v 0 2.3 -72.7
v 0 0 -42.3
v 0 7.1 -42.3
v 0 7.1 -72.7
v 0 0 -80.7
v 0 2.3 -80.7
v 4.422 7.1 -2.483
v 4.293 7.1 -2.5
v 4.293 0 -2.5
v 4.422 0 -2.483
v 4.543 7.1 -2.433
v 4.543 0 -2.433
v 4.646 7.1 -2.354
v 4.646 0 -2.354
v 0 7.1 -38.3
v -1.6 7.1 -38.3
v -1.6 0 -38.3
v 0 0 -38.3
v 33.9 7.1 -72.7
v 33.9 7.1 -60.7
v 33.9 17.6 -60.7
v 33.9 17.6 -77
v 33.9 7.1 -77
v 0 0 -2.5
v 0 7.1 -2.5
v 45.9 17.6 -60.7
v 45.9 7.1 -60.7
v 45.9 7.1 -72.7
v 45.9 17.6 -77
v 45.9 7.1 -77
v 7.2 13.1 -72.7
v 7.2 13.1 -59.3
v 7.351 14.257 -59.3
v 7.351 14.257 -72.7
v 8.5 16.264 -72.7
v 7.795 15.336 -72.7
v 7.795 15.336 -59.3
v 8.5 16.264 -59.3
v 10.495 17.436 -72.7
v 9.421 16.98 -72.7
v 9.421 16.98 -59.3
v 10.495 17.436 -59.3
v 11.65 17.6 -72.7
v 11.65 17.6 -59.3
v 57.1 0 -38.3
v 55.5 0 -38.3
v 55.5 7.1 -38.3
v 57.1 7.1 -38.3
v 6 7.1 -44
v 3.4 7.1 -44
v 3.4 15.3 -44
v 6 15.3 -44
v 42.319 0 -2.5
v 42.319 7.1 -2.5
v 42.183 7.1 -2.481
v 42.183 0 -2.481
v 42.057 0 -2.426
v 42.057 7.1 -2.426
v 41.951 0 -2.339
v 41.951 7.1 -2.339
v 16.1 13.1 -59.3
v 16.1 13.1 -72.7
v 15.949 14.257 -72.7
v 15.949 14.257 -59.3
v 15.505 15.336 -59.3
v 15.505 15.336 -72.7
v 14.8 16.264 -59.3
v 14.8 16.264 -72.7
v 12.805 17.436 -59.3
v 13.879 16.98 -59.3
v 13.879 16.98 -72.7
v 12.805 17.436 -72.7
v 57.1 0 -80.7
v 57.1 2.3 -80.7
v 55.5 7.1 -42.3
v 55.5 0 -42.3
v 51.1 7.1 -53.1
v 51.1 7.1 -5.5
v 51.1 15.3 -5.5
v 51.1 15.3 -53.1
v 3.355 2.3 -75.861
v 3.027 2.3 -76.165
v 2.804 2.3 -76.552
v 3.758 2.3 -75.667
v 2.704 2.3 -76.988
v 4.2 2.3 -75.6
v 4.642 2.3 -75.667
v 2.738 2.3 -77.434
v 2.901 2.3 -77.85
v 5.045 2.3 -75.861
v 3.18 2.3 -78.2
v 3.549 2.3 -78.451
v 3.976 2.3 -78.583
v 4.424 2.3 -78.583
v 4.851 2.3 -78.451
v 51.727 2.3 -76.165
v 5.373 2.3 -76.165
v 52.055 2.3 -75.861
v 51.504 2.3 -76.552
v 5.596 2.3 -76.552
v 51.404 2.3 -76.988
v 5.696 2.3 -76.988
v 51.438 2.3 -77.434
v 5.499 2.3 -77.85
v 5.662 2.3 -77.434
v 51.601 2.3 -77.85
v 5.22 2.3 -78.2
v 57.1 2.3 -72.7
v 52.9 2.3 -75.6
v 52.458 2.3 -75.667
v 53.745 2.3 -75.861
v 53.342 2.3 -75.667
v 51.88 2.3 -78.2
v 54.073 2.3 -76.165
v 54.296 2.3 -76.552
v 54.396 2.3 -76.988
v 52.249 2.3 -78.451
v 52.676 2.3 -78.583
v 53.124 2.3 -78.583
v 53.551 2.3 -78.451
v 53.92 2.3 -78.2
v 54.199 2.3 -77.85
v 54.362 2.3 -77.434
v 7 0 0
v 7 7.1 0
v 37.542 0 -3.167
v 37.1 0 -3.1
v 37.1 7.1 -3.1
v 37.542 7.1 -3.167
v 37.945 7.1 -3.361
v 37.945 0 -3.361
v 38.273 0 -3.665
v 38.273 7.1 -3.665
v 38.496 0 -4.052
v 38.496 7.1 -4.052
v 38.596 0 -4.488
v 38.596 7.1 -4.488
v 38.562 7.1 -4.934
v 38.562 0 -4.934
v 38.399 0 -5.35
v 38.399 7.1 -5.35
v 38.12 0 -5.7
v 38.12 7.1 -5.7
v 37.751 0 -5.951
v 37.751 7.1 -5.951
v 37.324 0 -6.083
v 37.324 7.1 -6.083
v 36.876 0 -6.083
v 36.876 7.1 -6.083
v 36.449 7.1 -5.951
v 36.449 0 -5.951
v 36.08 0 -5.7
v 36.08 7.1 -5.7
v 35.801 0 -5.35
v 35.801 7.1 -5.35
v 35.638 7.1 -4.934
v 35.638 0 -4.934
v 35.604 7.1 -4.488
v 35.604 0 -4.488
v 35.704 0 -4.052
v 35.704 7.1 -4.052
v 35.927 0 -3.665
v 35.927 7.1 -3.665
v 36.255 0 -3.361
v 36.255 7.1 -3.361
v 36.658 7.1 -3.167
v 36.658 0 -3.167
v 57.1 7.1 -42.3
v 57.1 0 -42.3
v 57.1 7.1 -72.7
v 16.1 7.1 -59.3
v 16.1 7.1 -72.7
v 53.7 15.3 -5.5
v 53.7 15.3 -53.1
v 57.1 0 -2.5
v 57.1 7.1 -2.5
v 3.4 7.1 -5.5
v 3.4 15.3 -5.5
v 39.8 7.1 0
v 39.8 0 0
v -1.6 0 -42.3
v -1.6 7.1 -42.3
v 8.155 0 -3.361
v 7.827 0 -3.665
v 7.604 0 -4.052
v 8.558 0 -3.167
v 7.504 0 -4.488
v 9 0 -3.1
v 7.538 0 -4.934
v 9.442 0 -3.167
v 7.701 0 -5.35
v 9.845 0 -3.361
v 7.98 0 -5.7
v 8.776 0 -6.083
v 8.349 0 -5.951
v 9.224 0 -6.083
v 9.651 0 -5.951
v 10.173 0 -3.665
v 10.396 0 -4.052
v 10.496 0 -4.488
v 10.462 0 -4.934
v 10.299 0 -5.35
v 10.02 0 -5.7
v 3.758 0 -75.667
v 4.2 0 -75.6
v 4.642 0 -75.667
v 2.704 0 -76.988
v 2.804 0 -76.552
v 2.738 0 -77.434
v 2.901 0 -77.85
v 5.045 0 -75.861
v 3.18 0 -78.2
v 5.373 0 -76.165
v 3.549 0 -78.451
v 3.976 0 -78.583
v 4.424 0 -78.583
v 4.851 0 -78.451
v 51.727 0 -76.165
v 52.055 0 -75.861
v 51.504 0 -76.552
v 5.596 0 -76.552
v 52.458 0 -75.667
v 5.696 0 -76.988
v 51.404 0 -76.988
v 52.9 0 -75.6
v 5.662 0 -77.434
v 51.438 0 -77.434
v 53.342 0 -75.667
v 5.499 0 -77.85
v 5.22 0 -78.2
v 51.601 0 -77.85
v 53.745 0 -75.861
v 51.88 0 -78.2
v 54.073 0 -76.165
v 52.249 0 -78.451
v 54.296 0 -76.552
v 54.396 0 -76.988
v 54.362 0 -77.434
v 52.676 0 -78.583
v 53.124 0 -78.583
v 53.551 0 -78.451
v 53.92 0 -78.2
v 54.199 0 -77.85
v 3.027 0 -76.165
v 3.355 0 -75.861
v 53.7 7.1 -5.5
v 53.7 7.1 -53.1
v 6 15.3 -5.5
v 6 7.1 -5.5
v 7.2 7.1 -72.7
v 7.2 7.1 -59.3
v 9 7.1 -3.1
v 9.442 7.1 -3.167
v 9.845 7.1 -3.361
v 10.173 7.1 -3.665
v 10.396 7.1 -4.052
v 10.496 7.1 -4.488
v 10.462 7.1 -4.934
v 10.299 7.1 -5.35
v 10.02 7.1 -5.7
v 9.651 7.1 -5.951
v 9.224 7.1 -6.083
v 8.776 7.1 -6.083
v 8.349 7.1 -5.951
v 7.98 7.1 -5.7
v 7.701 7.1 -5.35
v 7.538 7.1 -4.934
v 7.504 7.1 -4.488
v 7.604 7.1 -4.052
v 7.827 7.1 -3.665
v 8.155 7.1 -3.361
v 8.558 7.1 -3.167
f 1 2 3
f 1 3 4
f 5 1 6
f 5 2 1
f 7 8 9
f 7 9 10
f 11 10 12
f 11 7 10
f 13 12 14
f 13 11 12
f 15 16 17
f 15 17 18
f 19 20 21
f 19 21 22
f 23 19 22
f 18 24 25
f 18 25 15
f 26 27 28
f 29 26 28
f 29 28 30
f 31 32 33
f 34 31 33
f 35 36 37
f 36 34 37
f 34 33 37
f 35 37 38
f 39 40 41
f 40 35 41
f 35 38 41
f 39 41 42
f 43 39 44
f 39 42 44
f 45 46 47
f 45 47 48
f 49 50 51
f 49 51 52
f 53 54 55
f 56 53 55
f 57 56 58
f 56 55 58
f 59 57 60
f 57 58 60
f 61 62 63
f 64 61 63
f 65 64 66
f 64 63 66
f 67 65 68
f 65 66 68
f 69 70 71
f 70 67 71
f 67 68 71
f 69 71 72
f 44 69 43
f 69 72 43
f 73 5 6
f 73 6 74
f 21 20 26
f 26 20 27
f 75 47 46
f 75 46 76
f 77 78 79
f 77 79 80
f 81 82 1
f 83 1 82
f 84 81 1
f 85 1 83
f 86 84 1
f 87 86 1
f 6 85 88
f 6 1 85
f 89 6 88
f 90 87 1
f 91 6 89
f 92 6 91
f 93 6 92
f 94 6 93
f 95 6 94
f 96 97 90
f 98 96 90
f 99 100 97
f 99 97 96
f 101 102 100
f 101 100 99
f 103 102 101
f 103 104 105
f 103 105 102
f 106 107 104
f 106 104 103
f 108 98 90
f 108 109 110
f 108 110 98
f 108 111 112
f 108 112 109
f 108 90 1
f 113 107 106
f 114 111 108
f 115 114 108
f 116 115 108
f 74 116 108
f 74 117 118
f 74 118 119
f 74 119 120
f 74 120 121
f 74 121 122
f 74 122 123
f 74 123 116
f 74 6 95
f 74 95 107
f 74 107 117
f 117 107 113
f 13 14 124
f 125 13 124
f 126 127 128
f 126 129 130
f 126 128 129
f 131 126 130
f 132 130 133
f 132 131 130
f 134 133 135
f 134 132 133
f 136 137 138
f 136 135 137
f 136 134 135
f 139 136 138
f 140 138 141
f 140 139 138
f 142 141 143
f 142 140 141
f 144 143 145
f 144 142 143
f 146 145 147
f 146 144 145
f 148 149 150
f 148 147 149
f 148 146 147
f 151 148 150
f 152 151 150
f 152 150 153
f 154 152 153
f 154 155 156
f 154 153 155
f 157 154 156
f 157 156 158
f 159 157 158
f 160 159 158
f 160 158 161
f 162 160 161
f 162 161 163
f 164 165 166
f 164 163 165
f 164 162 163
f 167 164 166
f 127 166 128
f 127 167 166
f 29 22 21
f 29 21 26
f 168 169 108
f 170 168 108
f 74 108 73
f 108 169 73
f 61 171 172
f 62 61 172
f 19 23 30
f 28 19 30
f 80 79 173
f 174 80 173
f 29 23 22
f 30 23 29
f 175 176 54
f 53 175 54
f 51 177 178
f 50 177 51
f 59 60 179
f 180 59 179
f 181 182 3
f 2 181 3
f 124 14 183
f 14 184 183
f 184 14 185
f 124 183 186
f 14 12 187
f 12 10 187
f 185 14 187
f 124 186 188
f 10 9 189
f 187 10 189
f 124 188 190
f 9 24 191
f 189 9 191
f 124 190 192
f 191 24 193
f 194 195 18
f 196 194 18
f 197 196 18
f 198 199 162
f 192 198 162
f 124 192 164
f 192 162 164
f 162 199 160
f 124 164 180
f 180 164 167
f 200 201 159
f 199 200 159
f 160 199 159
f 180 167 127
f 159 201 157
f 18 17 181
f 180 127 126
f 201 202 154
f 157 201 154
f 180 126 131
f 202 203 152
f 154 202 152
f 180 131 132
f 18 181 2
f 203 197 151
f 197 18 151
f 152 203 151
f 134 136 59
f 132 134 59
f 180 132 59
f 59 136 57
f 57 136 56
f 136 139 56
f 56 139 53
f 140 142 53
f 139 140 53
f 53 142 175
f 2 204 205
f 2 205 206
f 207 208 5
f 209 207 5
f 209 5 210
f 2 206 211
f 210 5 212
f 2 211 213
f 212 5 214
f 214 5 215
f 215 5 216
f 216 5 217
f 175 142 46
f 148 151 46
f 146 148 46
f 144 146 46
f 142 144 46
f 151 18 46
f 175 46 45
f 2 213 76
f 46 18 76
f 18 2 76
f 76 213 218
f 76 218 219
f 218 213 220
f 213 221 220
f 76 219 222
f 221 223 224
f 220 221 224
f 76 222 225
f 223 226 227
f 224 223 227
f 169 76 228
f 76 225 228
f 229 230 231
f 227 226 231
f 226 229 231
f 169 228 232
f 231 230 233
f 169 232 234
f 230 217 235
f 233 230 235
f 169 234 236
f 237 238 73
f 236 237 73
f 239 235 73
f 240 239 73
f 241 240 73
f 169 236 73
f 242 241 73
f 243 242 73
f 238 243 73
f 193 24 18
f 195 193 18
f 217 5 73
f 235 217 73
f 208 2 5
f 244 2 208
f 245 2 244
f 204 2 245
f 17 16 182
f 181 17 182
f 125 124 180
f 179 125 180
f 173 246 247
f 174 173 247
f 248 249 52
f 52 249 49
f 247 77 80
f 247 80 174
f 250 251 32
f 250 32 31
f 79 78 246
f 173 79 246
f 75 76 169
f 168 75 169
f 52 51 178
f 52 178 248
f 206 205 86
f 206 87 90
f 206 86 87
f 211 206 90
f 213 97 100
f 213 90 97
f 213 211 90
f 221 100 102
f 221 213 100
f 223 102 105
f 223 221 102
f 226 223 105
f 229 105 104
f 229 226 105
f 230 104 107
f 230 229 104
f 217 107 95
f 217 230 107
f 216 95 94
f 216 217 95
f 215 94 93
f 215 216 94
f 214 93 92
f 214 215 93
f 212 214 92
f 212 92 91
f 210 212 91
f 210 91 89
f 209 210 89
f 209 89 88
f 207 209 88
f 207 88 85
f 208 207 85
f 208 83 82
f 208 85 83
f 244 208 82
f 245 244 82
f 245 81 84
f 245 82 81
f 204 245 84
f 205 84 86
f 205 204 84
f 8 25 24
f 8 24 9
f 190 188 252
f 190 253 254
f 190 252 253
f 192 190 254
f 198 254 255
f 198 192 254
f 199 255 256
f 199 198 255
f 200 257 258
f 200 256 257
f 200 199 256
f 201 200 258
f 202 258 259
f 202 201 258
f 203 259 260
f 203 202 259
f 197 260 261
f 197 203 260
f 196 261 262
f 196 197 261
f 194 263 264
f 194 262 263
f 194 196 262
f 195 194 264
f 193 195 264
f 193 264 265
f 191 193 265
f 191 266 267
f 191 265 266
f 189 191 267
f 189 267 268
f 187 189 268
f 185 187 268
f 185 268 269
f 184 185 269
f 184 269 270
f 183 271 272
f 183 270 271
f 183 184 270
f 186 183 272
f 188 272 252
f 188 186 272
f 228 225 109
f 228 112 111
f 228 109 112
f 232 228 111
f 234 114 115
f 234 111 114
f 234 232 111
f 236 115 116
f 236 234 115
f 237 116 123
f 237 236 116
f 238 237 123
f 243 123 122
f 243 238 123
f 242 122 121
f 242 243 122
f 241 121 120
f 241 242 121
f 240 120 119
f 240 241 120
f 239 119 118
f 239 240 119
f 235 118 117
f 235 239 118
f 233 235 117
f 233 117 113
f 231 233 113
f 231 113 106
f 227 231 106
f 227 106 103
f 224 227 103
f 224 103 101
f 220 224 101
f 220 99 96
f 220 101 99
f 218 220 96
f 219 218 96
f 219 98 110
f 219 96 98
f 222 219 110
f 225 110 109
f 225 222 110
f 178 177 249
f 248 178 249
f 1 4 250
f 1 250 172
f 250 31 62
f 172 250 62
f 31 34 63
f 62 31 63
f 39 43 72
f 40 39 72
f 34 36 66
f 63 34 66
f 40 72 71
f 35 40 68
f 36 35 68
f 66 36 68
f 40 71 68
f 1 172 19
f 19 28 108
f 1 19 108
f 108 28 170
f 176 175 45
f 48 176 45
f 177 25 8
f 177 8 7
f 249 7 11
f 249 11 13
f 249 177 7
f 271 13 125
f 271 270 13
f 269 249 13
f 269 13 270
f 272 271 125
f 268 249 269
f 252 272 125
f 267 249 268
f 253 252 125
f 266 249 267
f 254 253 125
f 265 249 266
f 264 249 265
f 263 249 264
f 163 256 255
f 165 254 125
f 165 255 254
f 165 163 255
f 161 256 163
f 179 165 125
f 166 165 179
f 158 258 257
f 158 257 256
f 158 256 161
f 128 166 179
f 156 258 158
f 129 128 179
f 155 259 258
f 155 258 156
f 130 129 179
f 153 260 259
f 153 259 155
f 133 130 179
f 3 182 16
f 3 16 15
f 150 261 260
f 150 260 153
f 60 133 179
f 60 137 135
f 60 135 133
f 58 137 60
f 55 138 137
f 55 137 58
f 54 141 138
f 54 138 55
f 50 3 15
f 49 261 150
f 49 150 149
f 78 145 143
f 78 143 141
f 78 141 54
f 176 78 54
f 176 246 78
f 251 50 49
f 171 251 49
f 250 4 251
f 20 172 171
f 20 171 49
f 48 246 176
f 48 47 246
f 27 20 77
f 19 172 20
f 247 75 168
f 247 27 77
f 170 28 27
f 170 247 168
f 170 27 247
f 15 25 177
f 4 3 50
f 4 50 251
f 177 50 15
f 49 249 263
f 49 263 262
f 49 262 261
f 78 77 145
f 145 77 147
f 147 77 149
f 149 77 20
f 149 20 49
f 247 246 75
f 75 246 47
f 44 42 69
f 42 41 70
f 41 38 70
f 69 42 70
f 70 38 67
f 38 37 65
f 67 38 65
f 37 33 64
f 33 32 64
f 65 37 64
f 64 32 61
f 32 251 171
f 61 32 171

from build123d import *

# Parameters (mm, degrees)
SKETCH_1_W               = 57.1
SKETCH_1_H               = 80.7
EXTRUDE_1_DEPTH          = 7.1
SKETCH_3_W               = 57.1
SKETCH_3_H               = 8
CUT_EXTRUDE_2_DEPTH      = 4.8
CUT_EXTRUDE_3_DEPTH      = 100.112612719
SKETCH_5_W               = 1.6
SKETCH_5_H               = 4
CUT_EXTRUDE_4_DEPTH      = 100.112612719
SKETCH_6_W               = 1.6
SKETCH_6_H               = 4
EXTRUDE_2_DEPTH          = 7.1
SKETCH_7_W               = 2.6
SKETCH_7_H               = 47.6
SKETCH_7_H_2             = 38.5
EXTRUDE_3_DEPTH          = 8.2
SKETCH_8_W               = 12
SKETCH_8_H               = 16.3
EXTRUDE_4_DEPTH          = 10.5
SKETCH_9_W               = 4.45
SKETCH_9_H               = 3
EXTRUDE_5_DEPTH          = 10.5
SKETCH_10_W              = 8.9
SKETCH_10_H              = 10.4
EXTRUDE_6_DEPTH          = 10.5
FILLET_1_R               = 4.5
CUT_EXTRUDE_7_DEPTH      = 101.034943895
CUT_EXTRUDE_7_DEPTH_BACK = 101.034943895
SKETCH_11_R              = 1.5


with BuildPart() as part:
    # 草图1 → 凸台-拉伸1 (new body)
    with BuildSketch(Plane(origin=(0, 0, 0), x_dir=(1, 0, 0), z_dir=(0, 1, 0))):
        with Locations((28.55, 40.35)):
            Rectangle(SKETCH_1_W, SKETCH_1_H)
    extrude(amount=EXTRUDE_1_DEPTH)

    # 草图3 → 切除-拉伸2 (cut)
    with BuildSketch(Plane(origin=(0, 7.1, 0), x_dir=(1, 0, 0), z_dir=(0, 1, 0))):
        with Locations((28.55, 76.7)):
            Rectangle(SKETCH_3_W, SKETCH_3_H)
    extrude(amount=-CUT_EXTRUDE_2_DEPTH, mode=Mode.SUBTRACT)

    # 草图4 → 切除-拉伸3 (cut, through all)
    with BuildSketch(Plane(origin=(0, 7.1, 0), x_dir=(1, 0, 0), z_dir=(0, 1, 0))):
        with BuildLine():
            Line((57.1, 0), (57.1, 2.5))
            Line((57.1, 2.5), (42.31941151, 2.5))
            ThreePointArc((42.31941151, 2.5), (42.118493782, 2.457855945), (41.951446004, 2.338528265))
            Line((41.951446004, 2.338528265), (39.8, 0))
            Line((39.8, 0), (57.1, 0))
        make_face()
        with BuildLine():
            Line((0, 2.5), (4.292893219, 2.5))
            ThreePointArc((4.292893219, 2.5), (4.484234935, 2.461939766), (4.646446609, 2.353553391))
            Line((4.646446609, 2.353553391), (7, 0))
            Line((7, 0), (0, 0))
            Line((0, 0), (0, 2.5))
        make_face()
    extrude(amount=-CUT_EXTRUDE_3_DEPTH, mode=Mode.SUBTRACT)

    # 草图5 → 切除-拉伸4 (cut, through all)
    with BuildSketch(Plane(origin=(0, 7.1, 0), x_dir=(1, 0, 0), z_dir=(0, 1, 0))):
        with Locations((56.3, 40.3)):
            Rectangle(SKETCH_5_W, SKETCH_5_H)
    extrude(amount=-CUT_EXTRUDE_4_DEPTH, mode=Mode.SUBTRACT)

    # 草图6 → 凸台-拉伸2 (add)
    with BuildSketch(Plane(origin=(0, 7.1, 0), x_dir=(1, 0, 0), z_dir=(0, 1, 0))):
        with Locations((-0.8, 40.3)):
            Rectangle(SKETCH_6_W, SKETCH_6_H)
    extrude(amount=-EXTRUDE_2_DEPTH)

    # 草图7 → 凸台-拉伸3 (add)
    with BuildSketch(Plane(origin=(0, 7.1, 0), x_dir=(1, 0, 0), z_dir=(0, 1, 0))):
        with Locations((52.4, 29.3)):
            Rectangle(SKETCH_7_W, SKETCH_7_H)
        with Locations((4.7, 24.75)):
            Rectangle(SKETCH_7_W, SKETCH_7_H_2)
    extrude(amount=EXTRUDE_3_DEPTH)

    # 草图8 → 凸台-拉伸4 (add)
    with BuildSketch(Plane(origin=(0, 7.1, 0), x_dir=(1, 0, 0), z_dir=(0, 1, 0))):
        with Locations((39.9, 68.85)):
            Rectangle(SKETCH_8_W, SKETCH_8_H)
    extrude(amount=EXTRUDE_4_DEPTH)

    # 草图9 → 凸台-拉伸5 (add)
    with BuildSketch(Plane(origin=(0, 7.1, 0), x_dir=(1, 0, 0), z_dir=(0, 1, 0))):
        with Locations((13.875, 71.2)):
            Rectangle(SKETCH_9_W, SKETCH_9_H)
        with Locations((9.425, 71.2)):
            Rectangle(SKETCH_9_W, SKETCH_9_H)
    extrude(amount=EXTRUDE_5_DEPTH)

    # 草图10 → 凸台-拉伸6 (add)
    with BuildSketch(Plane(origin=(0, 7.1, 0), x_dir=(1, 0, 0), z_dir=(0, 1, 0))):
        with Locations((11.65, 64.5)):
            Rectangle(SKETCH_10_W, SKETCH_10_H)
    extrude(amount=EXTRUDE_6_DEPTH)

    # 圆角1
    # the kernel refuses this fillet: 4.5 mm, written as the material it takes off along each edge
    with BuildSketch(Plane(origin=(7.2, 17.6, -48.05), x_dir=(0, -1, 0), z_dir=(0, 0, -1))) as fillet_1_piece_1:
        with BuildLine():
            CenterArc((FILLET_1_R, -FILLET_1_R), FILLET_1_R, 90, 90)
            Line((0, -FILLET_1_R), (0, 0))
            Line((0, 0), (FILLET_1_R, 0))
        make_face()
    extrude(amount=35.9, mode=Mode.SUBTRACT)
    with BuildSketch(Plane(origin=(16.1, 17.6, -83.95), x_dir=(-1, 0, 0), z_dir=(0, 0, 1))) as fillet_1_piece_2:
        with BuildLine():
            CenterArc((FILLET_1_R, FILLET_1_R), FILLET_1_R, 180, 90)
            Line((0, FILLET_1_R), (0, 0))
            Line((0, 0), (FILLET_1_R, 0))
        make_face()
    extrude(amount=35.9, mode=Mode.SUBTRACT)

    # 草图11 → 切除-拉伸7 (cut, two sides: drawn at the far end of the back side and taken through both)
    with BuildSketch(Plane(origin=(0, 2.3, 0), x_dir=(1, 0, 0), z_dir=(0, 1, 0)).offset(-CUT_EXTRUDE_7_DEPTH_BACK)):
        with Locations(Location((52.9, 77.1, 0), (0, 0, 270))):
            Circle(SKETCH_11_R)
        with Locations(Location((4.2, 77.1, 0), (0, 0, 270))):
            Circle(SKETCH_11_R)
        with Locations(Location((37.1, 4.6, 0), (0, 0, 270))):
            Circle(SKETCH_11_R)
        with Locations(Location((9, 4.6, 0), (0, 0, 270))):
            Circle(SKETCH_11_R)
    extrude(amount=CUT_EXTRUDE_7_DEPTH + CUT_EXTRUDE_7_DEPTH_BACK, mode=Mode.SUBTRACT)


solid = part.part
